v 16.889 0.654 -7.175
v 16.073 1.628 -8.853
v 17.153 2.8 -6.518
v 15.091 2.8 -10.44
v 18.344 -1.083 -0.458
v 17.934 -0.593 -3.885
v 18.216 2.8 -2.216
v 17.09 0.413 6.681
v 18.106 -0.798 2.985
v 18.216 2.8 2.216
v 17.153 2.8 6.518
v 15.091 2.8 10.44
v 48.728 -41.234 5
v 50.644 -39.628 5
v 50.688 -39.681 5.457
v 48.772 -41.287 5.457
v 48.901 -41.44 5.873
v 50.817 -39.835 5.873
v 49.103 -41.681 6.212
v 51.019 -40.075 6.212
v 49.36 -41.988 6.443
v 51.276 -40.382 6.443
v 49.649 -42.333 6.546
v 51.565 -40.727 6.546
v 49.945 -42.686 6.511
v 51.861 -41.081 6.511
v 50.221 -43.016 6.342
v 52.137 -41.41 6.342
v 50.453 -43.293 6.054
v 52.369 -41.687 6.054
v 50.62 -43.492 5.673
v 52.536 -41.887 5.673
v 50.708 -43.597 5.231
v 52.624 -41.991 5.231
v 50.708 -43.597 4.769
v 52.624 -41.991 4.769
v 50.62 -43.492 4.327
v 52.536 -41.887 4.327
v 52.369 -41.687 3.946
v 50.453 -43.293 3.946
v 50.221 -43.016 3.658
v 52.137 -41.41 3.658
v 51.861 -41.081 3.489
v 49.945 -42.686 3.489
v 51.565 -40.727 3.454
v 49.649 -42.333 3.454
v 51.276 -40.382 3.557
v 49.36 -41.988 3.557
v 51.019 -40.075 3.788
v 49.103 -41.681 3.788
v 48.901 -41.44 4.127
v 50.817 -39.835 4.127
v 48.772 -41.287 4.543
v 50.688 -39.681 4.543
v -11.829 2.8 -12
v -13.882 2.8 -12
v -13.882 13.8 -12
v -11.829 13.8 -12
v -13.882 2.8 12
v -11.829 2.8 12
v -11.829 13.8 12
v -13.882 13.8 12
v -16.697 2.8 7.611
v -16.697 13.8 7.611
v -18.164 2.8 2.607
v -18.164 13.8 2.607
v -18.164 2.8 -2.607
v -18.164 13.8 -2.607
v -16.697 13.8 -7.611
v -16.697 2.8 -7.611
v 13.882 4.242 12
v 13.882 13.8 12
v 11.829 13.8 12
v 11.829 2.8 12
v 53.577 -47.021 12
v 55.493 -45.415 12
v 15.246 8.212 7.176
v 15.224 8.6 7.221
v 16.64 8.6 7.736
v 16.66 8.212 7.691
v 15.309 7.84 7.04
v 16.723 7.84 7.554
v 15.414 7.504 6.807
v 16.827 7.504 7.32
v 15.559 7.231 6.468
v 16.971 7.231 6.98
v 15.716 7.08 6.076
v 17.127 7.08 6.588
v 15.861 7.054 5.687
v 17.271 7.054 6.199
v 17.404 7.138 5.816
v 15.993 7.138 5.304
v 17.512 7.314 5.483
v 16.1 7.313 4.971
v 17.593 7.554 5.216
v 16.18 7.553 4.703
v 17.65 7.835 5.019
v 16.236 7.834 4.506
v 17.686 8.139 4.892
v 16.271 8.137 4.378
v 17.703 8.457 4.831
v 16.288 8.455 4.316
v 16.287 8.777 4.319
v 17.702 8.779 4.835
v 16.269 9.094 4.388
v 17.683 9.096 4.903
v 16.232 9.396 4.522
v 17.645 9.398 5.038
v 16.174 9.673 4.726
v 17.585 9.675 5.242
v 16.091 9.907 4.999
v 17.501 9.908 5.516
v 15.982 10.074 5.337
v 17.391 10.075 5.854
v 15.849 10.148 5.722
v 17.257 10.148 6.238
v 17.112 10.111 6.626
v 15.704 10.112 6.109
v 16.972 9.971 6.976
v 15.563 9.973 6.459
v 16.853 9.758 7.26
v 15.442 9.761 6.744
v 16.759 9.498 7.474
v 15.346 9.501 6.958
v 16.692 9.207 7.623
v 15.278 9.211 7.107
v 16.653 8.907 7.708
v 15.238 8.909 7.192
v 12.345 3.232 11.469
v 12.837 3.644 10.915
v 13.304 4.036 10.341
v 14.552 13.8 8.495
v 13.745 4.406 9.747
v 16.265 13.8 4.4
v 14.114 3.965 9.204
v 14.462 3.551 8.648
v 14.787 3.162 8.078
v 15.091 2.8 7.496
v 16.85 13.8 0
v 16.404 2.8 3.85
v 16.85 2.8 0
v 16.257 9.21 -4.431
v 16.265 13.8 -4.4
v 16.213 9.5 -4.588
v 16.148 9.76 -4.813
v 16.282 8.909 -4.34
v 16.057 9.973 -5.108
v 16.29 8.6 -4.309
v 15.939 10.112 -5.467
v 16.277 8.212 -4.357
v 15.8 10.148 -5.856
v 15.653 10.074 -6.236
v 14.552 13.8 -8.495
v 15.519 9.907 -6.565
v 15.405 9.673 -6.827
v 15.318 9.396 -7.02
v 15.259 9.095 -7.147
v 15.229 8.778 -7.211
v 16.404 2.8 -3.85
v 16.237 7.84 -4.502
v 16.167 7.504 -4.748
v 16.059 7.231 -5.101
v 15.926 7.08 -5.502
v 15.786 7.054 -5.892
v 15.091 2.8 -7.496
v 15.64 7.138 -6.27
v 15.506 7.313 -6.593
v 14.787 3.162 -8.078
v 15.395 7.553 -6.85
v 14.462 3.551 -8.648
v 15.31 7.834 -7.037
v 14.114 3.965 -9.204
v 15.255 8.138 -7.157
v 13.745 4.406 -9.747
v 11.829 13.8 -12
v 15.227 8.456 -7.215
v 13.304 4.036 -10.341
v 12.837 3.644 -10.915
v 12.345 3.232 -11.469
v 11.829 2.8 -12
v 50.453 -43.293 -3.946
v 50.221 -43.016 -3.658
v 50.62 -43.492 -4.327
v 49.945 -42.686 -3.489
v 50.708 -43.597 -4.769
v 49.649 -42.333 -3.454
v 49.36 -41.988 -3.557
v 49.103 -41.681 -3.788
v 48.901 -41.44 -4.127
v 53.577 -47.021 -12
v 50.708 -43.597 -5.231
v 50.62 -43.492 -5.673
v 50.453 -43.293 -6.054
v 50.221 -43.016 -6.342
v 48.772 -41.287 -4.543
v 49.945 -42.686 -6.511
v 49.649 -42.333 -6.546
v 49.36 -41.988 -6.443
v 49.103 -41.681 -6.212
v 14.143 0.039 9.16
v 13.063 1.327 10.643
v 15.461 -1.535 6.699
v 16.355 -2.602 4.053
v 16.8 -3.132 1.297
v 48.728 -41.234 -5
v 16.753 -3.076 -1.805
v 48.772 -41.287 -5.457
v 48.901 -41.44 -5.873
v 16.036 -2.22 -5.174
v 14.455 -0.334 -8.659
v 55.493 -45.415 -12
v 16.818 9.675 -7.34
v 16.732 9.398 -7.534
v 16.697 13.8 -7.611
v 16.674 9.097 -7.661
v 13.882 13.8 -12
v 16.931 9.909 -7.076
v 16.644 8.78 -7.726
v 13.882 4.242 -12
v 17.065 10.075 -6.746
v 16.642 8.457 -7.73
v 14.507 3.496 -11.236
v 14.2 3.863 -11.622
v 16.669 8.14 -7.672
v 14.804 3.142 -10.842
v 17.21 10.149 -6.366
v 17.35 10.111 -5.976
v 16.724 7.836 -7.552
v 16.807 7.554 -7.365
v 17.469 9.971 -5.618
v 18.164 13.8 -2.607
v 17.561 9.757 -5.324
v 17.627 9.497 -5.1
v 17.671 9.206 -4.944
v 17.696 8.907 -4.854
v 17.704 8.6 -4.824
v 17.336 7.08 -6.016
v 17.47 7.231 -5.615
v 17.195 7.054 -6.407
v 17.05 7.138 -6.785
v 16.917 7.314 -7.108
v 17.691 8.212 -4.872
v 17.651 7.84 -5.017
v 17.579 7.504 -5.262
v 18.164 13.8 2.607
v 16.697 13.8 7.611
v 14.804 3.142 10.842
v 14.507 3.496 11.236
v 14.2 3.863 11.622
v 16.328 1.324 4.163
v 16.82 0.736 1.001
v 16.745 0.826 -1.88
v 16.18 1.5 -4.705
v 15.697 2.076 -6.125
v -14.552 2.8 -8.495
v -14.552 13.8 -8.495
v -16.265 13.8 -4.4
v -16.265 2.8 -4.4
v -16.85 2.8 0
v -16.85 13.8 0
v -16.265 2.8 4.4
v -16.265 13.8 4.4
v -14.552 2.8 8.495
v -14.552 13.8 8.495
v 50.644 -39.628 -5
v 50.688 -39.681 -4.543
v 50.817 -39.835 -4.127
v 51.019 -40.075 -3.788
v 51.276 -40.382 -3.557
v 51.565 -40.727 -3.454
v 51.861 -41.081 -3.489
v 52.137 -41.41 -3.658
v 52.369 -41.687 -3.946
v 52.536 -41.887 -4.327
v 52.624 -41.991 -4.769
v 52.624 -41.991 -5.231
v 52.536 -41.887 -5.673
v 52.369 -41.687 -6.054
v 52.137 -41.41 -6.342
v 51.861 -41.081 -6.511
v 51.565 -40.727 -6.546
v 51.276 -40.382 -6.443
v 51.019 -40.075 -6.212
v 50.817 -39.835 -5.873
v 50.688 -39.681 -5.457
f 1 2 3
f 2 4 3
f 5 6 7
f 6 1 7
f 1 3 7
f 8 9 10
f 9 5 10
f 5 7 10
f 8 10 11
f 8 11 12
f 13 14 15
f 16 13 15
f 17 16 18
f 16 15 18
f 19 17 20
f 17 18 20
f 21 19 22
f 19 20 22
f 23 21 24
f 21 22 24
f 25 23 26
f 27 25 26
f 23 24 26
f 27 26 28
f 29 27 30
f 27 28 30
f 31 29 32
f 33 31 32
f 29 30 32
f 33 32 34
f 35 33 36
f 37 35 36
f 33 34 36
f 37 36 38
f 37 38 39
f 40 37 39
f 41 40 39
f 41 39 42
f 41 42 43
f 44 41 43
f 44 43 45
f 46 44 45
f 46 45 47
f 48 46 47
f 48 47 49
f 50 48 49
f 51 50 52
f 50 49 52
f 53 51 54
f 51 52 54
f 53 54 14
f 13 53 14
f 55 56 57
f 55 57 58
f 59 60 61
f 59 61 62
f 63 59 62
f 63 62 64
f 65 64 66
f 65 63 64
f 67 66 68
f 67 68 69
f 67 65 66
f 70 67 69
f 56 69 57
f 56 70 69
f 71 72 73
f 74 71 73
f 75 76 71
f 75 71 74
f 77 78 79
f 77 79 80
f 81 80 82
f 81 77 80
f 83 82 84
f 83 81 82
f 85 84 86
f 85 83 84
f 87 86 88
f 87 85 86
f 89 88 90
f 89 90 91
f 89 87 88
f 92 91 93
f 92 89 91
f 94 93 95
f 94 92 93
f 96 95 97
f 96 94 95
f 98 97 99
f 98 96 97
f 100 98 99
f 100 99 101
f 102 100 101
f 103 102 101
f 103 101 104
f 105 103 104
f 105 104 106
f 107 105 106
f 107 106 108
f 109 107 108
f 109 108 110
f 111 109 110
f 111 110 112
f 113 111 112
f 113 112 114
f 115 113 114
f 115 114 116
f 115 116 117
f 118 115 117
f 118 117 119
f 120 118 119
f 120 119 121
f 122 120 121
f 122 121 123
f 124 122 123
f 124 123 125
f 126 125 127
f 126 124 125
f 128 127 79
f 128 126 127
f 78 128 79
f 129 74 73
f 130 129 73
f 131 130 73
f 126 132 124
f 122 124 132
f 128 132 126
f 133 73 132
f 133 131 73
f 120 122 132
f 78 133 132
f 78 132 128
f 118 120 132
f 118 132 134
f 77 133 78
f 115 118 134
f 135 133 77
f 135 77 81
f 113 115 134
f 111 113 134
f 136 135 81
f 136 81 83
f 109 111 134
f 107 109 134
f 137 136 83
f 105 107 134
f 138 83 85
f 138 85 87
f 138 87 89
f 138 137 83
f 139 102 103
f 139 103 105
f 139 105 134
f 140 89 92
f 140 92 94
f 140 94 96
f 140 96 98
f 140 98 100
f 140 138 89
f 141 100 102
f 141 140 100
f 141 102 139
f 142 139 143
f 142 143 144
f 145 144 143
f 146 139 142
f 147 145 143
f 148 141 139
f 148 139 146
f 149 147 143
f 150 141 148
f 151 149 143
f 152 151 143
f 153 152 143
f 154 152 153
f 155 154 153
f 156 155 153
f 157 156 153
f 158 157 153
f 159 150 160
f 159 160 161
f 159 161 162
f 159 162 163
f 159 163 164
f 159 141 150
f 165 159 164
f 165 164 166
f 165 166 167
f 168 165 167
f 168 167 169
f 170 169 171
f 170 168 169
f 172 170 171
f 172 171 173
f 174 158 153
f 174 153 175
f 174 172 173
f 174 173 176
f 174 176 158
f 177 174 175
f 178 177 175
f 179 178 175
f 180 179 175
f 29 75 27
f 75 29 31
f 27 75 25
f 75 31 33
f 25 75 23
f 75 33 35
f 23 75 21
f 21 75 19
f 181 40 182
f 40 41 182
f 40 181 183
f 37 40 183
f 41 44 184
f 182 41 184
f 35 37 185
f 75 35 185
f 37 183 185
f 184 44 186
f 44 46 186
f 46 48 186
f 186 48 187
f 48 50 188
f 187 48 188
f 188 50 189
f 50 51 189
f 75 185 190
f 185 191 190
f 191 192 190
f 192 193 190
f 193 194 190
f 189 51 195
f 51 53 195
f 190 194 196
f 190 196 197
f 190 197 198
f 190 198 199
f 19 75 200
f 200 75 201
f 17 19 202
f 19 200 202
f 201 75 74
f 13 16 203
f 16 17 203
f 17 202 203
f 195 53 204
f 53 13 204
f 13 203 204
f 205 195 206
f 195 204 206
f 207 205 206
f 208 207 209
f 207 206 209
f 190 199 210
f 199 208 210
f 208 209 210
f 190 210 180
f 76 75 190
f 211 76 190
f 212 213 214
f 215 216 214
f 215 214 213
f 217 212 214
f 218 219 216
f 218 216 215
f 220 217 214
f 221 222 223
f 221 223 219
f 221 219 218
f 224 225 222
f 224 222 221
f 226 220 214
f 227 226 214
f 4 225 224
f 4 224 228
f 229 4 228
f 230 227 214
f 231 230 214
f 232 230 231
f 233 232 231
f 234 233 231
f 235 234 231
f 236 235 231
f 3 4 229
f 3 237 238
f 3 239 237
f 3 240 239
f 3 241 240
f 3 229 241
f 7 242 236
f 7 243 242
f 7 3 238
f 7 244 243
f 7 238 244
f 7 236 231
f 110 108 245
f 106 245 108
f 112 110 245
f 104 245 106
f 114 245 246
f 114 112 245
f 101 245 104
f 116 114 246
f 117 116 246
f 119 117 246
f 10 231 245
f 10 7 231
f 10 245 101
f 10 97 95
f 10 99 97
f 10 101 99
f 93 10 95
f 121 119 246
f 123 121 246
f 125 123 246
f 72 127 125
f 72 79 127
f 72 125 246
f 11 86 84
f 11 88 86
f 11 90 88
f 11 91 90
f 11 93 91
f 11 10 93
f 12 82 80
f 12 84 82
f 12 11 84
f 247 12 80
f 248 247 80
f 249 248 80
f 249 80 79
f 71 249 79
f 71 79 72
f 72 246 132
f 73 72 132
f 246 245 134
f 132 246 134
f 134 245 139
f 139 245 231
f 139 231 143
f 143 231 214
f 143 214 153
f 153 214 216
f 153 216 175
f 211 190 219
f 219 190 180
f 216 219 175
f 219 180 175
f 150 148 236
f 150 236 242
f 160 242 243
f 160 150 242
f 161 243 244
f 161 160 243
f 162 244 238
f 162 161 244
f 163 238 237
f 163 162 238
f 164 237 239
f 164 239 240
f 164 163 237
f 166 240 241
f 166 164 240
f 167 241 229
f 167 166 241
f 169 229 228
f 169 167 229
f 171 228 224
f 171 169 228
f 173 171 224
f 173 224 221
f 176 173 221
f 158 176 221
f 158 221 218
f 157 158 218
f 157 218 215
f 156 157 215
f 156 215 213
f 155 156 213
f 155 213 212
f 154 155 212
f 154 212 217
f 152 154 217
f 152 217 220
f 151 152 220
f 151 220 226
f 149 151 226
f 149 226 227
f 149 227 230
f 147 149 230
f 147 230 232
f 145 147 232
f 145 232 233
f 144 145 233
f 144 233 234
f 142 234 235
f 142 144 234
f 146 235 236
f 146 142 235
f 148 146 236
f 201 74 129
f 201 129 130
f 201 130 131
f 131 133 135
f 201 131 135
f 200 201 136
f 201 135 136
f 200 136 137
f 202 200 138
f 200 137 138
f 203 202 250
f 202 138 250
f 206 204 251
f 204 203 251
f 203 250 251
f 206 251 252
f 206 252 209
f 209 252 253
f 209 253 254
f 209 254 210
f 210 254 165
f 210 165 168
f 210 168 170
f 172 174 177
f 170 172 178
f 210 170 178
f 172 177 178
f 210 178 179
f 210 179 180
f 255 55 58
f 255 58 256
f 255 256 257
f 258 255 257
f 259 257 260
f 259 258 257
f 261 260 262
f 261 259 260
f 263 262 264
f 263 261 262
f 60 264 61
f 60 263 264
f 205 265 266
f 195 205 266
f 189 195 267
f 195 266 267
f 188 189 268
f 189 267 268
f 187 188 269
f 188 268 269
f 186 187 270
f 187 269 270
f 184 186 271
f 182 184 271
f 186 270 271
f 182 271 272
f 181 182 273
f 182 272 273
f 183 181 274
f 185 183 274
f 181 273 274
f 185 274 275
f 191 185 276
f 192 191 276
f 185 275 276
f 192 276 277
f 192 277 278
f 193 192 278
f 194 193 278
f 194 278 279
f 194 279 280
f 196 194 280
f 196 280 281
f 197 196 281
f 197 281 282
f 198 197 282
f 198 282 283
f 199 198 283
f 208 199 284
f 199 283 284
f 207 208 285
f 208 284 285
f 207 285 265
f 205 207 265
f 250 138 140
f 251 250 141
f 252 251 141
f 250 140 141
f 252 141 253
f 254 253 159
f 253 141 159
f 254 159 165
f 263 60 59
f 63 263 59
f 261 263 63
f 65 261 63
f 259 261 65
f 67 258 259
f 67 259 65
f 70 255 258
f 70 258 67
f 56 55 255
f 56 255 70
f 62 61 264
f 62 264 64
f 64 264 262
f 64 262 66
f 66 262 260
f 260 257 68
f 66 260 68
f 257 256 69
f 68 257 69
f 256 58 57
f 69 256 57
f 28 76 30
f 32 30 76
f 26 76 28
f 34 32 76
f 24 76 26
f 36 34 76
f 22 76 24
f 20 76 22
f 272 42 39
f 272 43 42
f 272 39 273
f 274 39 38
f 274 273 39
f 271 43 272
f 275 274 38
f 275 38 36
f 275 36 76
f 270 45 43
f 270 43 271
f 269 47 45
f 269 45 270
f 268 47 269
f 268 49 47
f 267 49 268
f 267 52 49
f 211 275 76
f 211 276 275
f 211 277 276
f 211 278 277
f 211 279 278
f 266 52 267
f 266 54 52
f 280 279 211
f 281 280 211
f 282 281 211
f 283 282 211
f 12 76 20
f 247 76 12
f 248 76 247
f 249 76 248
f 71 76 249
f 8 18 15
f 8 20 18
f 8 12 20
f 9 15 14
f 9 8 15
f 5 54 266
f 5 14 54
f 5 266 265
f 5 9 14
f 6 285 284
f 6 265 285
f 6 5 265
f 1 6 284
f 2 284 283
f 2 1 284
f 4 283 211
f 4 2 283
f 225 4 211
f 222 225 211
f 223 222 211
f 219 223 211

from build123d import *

# Parameters (mm, degrees)
BOSS_EXTRUDE1_DEPTH      = 10
BOSS_EXTRUDE1_DEPTH_BACK = 1
BOSS_EXTRUDE2_DEPTH      = 2.5
BOSS_EXTRUDE3_REACH      = 77.535
CUT_EXTRUDE1_REACH       = 85.202
SKETCH6_R                = 1.55
CUT_EXTRUDE2_DEPTH       = 2.5
CUT_EXTRUDE3_DEPTH       = 2.5
CUT_EXTRUDE3_DEPTH_BACK  = 2.5
SKETCH9_R                = 1.55
CUT_EXTRUDE4_DEPTH       = 2.5
CUT_EXTRUDE4_DEPTH_BACK  = 2.5
SKETCH8_R                = 1.55


with BuildPart() as part:
    # Sketch1 → Boss-Extrude1 (new, two sides: drawn at the far end of the back side and taken through both)
    with BuildSketch(Plane(origin=(0, 3.8, 0), x_dir=(1, 0, 0), z_dir=(0, 1, 0)).offset(-BOSS_EXTRUDE1_DEPTH_BACK)):
        with BuildLine():
            ThreePointArc((11.82888414, -12), (16.85, 0), (11.82888414, 12))
            Line((11.82888414, 12), (13.882452953, 12))
            ThreePointArc((13.882452953, 12), (18.35, 0), (13.882452953, -12))
            Line((13.882452953, -12), (11.82888414, -12))
        make_face()
        with BuildLine():
            Line((-11.82888414, -12), (-13.882452953, -12))
            ThreePointArc((-13.882452953, -12), (-18.35, 0), (-13.882452953, 12))
            Line((-13.882452953, 12), (-11.82888414, 12))
            ThreePointArc((-11.82888414, 12), (-16.85, 0), (-11.82888414, -12))
        make_face()
    extrude(amount=BOSS_EXTRUDE1_DEPTH + BOSS_EXTRUDE1_DEPTH_BACK)

    # Sketch3 → Boss-Extrude2 (add)
    with BuildSketch(Plane(origin=(8.327631, 6.978274302, 0), x_dir=(0, 0, -1), z_dir=(0.7664720008518675, 0.6422777217918545, 0))):
        Polygon((-12, -5.451307154), (-12, -6.770268653), (-12, -70.451307154), (12, -70.451307154), (12, -6.770268653), (12, -5.451307154), align=None)
    extrude(amount=BOSS_EXTRUDE2_DEPTH)

    # Boss-Extrude3: up to this face of the body (flat: up to its plane)
    boss_extrude3_end = Plane(part.part.faces().sort_by_distance((34.763054808, -20.676448222, 0))[0])
    # Sketch4 → Boss-Extrude3 (add, up to the picked face)
    with BuildSketch(Plane.XZ.offset(-2.8), mode=Mode.PRIVATE) as boss_extrude3_sk1:
        with BuildLine():
            Line((15.090581889, 10.440155087), (15.090581889, 7.496455045))
            ThreePointArc((15.090581889, 7.496455045), (16.85, 0), (15.090581889, -7.496455045))
            Line((15.090581889, -7.496455045), (15.090581889, -10.440155087))
            ThreePointArc((15.090581889, -10.440155087), (18.35, 0), (15.090581889, 10.440155087))
        make_face()
    boss_extrude3_tool1 = split(extrude(boss_extrude3_sk1.sketch, amount=BOSS_EXTRUDE3_REACH, mode=Mode.PRIVATE), bisect_by=boss_extrude3_end, keep=Keep.BOTH, mode=Mode.PRIVATE)
    add(boss_extrude3_tool1.solids().sort_by(Axis((15.301914, 2.8, 8.968305), (0, -1, 0)))[0])

    # Cut-Extrude1: up to this face of the body (flat: up to its plane)
    cut_extrude1_end = Plane(part.part.faces().sort_by_distance((32.702910098, -22.110340028, 0))[0])
    # Sketch5 → Cut-Extrude1 (cut, up to the picked face)
    with BuildSketch(Plane(origin=(0, 13.8, 0), x_dir=(1, 0, 0), z_dir=(0, 1, 0)), mode=Mode.PRIVATE) as cut_extrude1_sk1:
        with BuildLine():
            Line((11.82888414, 12), (11.82888414, -12))
            ThreePointArc((11.82888414, -12), (16.85, 0), (11.82888414, 12))
        make_face()
    cut_extrude1_tool1 = split(extrude(cut_extrude1_sk1.sketch, amount=-CUT_EXTRUDE1_REACH, mode=Mode.PRIVATE), bisect_by=cut_extrude1_end, keep=Keep.BOTH, mode=Mode.PRIVATE)
    add(cut_extrude1_tool1.solids().sort_by(Axis((13.865415, 13.8, 0), (0, -1, 0)))[0], mode=Mode.SUBTRACT)

    # Sketch6 → Cut-Extrude2 (cut)
    with BuildSketch(Plane(origin=(10.243811002, 8.583968606, 0), x_dir=(0, 0, -1), z_dir=(0.7664720008518675, 0.6422777217918545, 0))):
        with Locations(Location((-5, -64.451307154, 0), (0, 0, 90))):
            Circle(SKETCH6_R)
        with Locations(Location((5, -64.451307154, 0), (0, 0, 90))):
            Circle(SKETCH6_R)
    extrude(amount=-CUT_EXTRUDE2_DEPTH, mode=Mode.SUBTRACT)

    # Sketch9 → Cut-Extrude3 (cut, two sides: drawn at the far end of the back side and taken through both)
    with BuildSketch(Plane(origin=(16.115240106, 0, 5.865467716), x_dir=(0, 1, 0), z_dir=(0.9396926207859128, 0, 0.34202014332565694)).offset(-CUT_EXTRUDE3_DEPTH_BACK)):
        with Locations(Location((8.6, 0.028232901, 0), (0, 0, 90))):
            Circle(SKETCH9_R)
    extrude(amount=CUT_EXTRUDE3_DEPTH + CUT_EXTRUDE3_DEPTH_BACK, mode=Mode.SUBTRACT)

    # Sketch8 → Cut-Extrude4 (cut, two sides: drawn at the far end of the back side and taken through both)
    with BuildSketch(Plane(origin=(16.115240106, 0, -5.865467716), x_dir=(0, 1, 0), z_dir=(0.9396926207859081, 0, -0.34202014332566943)).offset(-CUT_EXTRUDE4_DEPTH_BACK)):
        with Locations(Location((8.6, -0.028232901, 0), (0, 0, 90))):
            Circle(SKETCH8_R)
    extrude(amount=CUT_EXTRUDE4_DEPTH + CUT_EXTRUDE4_DEPTH_BACK, mode=Mode.SUBTRACT)


solid = part.part
